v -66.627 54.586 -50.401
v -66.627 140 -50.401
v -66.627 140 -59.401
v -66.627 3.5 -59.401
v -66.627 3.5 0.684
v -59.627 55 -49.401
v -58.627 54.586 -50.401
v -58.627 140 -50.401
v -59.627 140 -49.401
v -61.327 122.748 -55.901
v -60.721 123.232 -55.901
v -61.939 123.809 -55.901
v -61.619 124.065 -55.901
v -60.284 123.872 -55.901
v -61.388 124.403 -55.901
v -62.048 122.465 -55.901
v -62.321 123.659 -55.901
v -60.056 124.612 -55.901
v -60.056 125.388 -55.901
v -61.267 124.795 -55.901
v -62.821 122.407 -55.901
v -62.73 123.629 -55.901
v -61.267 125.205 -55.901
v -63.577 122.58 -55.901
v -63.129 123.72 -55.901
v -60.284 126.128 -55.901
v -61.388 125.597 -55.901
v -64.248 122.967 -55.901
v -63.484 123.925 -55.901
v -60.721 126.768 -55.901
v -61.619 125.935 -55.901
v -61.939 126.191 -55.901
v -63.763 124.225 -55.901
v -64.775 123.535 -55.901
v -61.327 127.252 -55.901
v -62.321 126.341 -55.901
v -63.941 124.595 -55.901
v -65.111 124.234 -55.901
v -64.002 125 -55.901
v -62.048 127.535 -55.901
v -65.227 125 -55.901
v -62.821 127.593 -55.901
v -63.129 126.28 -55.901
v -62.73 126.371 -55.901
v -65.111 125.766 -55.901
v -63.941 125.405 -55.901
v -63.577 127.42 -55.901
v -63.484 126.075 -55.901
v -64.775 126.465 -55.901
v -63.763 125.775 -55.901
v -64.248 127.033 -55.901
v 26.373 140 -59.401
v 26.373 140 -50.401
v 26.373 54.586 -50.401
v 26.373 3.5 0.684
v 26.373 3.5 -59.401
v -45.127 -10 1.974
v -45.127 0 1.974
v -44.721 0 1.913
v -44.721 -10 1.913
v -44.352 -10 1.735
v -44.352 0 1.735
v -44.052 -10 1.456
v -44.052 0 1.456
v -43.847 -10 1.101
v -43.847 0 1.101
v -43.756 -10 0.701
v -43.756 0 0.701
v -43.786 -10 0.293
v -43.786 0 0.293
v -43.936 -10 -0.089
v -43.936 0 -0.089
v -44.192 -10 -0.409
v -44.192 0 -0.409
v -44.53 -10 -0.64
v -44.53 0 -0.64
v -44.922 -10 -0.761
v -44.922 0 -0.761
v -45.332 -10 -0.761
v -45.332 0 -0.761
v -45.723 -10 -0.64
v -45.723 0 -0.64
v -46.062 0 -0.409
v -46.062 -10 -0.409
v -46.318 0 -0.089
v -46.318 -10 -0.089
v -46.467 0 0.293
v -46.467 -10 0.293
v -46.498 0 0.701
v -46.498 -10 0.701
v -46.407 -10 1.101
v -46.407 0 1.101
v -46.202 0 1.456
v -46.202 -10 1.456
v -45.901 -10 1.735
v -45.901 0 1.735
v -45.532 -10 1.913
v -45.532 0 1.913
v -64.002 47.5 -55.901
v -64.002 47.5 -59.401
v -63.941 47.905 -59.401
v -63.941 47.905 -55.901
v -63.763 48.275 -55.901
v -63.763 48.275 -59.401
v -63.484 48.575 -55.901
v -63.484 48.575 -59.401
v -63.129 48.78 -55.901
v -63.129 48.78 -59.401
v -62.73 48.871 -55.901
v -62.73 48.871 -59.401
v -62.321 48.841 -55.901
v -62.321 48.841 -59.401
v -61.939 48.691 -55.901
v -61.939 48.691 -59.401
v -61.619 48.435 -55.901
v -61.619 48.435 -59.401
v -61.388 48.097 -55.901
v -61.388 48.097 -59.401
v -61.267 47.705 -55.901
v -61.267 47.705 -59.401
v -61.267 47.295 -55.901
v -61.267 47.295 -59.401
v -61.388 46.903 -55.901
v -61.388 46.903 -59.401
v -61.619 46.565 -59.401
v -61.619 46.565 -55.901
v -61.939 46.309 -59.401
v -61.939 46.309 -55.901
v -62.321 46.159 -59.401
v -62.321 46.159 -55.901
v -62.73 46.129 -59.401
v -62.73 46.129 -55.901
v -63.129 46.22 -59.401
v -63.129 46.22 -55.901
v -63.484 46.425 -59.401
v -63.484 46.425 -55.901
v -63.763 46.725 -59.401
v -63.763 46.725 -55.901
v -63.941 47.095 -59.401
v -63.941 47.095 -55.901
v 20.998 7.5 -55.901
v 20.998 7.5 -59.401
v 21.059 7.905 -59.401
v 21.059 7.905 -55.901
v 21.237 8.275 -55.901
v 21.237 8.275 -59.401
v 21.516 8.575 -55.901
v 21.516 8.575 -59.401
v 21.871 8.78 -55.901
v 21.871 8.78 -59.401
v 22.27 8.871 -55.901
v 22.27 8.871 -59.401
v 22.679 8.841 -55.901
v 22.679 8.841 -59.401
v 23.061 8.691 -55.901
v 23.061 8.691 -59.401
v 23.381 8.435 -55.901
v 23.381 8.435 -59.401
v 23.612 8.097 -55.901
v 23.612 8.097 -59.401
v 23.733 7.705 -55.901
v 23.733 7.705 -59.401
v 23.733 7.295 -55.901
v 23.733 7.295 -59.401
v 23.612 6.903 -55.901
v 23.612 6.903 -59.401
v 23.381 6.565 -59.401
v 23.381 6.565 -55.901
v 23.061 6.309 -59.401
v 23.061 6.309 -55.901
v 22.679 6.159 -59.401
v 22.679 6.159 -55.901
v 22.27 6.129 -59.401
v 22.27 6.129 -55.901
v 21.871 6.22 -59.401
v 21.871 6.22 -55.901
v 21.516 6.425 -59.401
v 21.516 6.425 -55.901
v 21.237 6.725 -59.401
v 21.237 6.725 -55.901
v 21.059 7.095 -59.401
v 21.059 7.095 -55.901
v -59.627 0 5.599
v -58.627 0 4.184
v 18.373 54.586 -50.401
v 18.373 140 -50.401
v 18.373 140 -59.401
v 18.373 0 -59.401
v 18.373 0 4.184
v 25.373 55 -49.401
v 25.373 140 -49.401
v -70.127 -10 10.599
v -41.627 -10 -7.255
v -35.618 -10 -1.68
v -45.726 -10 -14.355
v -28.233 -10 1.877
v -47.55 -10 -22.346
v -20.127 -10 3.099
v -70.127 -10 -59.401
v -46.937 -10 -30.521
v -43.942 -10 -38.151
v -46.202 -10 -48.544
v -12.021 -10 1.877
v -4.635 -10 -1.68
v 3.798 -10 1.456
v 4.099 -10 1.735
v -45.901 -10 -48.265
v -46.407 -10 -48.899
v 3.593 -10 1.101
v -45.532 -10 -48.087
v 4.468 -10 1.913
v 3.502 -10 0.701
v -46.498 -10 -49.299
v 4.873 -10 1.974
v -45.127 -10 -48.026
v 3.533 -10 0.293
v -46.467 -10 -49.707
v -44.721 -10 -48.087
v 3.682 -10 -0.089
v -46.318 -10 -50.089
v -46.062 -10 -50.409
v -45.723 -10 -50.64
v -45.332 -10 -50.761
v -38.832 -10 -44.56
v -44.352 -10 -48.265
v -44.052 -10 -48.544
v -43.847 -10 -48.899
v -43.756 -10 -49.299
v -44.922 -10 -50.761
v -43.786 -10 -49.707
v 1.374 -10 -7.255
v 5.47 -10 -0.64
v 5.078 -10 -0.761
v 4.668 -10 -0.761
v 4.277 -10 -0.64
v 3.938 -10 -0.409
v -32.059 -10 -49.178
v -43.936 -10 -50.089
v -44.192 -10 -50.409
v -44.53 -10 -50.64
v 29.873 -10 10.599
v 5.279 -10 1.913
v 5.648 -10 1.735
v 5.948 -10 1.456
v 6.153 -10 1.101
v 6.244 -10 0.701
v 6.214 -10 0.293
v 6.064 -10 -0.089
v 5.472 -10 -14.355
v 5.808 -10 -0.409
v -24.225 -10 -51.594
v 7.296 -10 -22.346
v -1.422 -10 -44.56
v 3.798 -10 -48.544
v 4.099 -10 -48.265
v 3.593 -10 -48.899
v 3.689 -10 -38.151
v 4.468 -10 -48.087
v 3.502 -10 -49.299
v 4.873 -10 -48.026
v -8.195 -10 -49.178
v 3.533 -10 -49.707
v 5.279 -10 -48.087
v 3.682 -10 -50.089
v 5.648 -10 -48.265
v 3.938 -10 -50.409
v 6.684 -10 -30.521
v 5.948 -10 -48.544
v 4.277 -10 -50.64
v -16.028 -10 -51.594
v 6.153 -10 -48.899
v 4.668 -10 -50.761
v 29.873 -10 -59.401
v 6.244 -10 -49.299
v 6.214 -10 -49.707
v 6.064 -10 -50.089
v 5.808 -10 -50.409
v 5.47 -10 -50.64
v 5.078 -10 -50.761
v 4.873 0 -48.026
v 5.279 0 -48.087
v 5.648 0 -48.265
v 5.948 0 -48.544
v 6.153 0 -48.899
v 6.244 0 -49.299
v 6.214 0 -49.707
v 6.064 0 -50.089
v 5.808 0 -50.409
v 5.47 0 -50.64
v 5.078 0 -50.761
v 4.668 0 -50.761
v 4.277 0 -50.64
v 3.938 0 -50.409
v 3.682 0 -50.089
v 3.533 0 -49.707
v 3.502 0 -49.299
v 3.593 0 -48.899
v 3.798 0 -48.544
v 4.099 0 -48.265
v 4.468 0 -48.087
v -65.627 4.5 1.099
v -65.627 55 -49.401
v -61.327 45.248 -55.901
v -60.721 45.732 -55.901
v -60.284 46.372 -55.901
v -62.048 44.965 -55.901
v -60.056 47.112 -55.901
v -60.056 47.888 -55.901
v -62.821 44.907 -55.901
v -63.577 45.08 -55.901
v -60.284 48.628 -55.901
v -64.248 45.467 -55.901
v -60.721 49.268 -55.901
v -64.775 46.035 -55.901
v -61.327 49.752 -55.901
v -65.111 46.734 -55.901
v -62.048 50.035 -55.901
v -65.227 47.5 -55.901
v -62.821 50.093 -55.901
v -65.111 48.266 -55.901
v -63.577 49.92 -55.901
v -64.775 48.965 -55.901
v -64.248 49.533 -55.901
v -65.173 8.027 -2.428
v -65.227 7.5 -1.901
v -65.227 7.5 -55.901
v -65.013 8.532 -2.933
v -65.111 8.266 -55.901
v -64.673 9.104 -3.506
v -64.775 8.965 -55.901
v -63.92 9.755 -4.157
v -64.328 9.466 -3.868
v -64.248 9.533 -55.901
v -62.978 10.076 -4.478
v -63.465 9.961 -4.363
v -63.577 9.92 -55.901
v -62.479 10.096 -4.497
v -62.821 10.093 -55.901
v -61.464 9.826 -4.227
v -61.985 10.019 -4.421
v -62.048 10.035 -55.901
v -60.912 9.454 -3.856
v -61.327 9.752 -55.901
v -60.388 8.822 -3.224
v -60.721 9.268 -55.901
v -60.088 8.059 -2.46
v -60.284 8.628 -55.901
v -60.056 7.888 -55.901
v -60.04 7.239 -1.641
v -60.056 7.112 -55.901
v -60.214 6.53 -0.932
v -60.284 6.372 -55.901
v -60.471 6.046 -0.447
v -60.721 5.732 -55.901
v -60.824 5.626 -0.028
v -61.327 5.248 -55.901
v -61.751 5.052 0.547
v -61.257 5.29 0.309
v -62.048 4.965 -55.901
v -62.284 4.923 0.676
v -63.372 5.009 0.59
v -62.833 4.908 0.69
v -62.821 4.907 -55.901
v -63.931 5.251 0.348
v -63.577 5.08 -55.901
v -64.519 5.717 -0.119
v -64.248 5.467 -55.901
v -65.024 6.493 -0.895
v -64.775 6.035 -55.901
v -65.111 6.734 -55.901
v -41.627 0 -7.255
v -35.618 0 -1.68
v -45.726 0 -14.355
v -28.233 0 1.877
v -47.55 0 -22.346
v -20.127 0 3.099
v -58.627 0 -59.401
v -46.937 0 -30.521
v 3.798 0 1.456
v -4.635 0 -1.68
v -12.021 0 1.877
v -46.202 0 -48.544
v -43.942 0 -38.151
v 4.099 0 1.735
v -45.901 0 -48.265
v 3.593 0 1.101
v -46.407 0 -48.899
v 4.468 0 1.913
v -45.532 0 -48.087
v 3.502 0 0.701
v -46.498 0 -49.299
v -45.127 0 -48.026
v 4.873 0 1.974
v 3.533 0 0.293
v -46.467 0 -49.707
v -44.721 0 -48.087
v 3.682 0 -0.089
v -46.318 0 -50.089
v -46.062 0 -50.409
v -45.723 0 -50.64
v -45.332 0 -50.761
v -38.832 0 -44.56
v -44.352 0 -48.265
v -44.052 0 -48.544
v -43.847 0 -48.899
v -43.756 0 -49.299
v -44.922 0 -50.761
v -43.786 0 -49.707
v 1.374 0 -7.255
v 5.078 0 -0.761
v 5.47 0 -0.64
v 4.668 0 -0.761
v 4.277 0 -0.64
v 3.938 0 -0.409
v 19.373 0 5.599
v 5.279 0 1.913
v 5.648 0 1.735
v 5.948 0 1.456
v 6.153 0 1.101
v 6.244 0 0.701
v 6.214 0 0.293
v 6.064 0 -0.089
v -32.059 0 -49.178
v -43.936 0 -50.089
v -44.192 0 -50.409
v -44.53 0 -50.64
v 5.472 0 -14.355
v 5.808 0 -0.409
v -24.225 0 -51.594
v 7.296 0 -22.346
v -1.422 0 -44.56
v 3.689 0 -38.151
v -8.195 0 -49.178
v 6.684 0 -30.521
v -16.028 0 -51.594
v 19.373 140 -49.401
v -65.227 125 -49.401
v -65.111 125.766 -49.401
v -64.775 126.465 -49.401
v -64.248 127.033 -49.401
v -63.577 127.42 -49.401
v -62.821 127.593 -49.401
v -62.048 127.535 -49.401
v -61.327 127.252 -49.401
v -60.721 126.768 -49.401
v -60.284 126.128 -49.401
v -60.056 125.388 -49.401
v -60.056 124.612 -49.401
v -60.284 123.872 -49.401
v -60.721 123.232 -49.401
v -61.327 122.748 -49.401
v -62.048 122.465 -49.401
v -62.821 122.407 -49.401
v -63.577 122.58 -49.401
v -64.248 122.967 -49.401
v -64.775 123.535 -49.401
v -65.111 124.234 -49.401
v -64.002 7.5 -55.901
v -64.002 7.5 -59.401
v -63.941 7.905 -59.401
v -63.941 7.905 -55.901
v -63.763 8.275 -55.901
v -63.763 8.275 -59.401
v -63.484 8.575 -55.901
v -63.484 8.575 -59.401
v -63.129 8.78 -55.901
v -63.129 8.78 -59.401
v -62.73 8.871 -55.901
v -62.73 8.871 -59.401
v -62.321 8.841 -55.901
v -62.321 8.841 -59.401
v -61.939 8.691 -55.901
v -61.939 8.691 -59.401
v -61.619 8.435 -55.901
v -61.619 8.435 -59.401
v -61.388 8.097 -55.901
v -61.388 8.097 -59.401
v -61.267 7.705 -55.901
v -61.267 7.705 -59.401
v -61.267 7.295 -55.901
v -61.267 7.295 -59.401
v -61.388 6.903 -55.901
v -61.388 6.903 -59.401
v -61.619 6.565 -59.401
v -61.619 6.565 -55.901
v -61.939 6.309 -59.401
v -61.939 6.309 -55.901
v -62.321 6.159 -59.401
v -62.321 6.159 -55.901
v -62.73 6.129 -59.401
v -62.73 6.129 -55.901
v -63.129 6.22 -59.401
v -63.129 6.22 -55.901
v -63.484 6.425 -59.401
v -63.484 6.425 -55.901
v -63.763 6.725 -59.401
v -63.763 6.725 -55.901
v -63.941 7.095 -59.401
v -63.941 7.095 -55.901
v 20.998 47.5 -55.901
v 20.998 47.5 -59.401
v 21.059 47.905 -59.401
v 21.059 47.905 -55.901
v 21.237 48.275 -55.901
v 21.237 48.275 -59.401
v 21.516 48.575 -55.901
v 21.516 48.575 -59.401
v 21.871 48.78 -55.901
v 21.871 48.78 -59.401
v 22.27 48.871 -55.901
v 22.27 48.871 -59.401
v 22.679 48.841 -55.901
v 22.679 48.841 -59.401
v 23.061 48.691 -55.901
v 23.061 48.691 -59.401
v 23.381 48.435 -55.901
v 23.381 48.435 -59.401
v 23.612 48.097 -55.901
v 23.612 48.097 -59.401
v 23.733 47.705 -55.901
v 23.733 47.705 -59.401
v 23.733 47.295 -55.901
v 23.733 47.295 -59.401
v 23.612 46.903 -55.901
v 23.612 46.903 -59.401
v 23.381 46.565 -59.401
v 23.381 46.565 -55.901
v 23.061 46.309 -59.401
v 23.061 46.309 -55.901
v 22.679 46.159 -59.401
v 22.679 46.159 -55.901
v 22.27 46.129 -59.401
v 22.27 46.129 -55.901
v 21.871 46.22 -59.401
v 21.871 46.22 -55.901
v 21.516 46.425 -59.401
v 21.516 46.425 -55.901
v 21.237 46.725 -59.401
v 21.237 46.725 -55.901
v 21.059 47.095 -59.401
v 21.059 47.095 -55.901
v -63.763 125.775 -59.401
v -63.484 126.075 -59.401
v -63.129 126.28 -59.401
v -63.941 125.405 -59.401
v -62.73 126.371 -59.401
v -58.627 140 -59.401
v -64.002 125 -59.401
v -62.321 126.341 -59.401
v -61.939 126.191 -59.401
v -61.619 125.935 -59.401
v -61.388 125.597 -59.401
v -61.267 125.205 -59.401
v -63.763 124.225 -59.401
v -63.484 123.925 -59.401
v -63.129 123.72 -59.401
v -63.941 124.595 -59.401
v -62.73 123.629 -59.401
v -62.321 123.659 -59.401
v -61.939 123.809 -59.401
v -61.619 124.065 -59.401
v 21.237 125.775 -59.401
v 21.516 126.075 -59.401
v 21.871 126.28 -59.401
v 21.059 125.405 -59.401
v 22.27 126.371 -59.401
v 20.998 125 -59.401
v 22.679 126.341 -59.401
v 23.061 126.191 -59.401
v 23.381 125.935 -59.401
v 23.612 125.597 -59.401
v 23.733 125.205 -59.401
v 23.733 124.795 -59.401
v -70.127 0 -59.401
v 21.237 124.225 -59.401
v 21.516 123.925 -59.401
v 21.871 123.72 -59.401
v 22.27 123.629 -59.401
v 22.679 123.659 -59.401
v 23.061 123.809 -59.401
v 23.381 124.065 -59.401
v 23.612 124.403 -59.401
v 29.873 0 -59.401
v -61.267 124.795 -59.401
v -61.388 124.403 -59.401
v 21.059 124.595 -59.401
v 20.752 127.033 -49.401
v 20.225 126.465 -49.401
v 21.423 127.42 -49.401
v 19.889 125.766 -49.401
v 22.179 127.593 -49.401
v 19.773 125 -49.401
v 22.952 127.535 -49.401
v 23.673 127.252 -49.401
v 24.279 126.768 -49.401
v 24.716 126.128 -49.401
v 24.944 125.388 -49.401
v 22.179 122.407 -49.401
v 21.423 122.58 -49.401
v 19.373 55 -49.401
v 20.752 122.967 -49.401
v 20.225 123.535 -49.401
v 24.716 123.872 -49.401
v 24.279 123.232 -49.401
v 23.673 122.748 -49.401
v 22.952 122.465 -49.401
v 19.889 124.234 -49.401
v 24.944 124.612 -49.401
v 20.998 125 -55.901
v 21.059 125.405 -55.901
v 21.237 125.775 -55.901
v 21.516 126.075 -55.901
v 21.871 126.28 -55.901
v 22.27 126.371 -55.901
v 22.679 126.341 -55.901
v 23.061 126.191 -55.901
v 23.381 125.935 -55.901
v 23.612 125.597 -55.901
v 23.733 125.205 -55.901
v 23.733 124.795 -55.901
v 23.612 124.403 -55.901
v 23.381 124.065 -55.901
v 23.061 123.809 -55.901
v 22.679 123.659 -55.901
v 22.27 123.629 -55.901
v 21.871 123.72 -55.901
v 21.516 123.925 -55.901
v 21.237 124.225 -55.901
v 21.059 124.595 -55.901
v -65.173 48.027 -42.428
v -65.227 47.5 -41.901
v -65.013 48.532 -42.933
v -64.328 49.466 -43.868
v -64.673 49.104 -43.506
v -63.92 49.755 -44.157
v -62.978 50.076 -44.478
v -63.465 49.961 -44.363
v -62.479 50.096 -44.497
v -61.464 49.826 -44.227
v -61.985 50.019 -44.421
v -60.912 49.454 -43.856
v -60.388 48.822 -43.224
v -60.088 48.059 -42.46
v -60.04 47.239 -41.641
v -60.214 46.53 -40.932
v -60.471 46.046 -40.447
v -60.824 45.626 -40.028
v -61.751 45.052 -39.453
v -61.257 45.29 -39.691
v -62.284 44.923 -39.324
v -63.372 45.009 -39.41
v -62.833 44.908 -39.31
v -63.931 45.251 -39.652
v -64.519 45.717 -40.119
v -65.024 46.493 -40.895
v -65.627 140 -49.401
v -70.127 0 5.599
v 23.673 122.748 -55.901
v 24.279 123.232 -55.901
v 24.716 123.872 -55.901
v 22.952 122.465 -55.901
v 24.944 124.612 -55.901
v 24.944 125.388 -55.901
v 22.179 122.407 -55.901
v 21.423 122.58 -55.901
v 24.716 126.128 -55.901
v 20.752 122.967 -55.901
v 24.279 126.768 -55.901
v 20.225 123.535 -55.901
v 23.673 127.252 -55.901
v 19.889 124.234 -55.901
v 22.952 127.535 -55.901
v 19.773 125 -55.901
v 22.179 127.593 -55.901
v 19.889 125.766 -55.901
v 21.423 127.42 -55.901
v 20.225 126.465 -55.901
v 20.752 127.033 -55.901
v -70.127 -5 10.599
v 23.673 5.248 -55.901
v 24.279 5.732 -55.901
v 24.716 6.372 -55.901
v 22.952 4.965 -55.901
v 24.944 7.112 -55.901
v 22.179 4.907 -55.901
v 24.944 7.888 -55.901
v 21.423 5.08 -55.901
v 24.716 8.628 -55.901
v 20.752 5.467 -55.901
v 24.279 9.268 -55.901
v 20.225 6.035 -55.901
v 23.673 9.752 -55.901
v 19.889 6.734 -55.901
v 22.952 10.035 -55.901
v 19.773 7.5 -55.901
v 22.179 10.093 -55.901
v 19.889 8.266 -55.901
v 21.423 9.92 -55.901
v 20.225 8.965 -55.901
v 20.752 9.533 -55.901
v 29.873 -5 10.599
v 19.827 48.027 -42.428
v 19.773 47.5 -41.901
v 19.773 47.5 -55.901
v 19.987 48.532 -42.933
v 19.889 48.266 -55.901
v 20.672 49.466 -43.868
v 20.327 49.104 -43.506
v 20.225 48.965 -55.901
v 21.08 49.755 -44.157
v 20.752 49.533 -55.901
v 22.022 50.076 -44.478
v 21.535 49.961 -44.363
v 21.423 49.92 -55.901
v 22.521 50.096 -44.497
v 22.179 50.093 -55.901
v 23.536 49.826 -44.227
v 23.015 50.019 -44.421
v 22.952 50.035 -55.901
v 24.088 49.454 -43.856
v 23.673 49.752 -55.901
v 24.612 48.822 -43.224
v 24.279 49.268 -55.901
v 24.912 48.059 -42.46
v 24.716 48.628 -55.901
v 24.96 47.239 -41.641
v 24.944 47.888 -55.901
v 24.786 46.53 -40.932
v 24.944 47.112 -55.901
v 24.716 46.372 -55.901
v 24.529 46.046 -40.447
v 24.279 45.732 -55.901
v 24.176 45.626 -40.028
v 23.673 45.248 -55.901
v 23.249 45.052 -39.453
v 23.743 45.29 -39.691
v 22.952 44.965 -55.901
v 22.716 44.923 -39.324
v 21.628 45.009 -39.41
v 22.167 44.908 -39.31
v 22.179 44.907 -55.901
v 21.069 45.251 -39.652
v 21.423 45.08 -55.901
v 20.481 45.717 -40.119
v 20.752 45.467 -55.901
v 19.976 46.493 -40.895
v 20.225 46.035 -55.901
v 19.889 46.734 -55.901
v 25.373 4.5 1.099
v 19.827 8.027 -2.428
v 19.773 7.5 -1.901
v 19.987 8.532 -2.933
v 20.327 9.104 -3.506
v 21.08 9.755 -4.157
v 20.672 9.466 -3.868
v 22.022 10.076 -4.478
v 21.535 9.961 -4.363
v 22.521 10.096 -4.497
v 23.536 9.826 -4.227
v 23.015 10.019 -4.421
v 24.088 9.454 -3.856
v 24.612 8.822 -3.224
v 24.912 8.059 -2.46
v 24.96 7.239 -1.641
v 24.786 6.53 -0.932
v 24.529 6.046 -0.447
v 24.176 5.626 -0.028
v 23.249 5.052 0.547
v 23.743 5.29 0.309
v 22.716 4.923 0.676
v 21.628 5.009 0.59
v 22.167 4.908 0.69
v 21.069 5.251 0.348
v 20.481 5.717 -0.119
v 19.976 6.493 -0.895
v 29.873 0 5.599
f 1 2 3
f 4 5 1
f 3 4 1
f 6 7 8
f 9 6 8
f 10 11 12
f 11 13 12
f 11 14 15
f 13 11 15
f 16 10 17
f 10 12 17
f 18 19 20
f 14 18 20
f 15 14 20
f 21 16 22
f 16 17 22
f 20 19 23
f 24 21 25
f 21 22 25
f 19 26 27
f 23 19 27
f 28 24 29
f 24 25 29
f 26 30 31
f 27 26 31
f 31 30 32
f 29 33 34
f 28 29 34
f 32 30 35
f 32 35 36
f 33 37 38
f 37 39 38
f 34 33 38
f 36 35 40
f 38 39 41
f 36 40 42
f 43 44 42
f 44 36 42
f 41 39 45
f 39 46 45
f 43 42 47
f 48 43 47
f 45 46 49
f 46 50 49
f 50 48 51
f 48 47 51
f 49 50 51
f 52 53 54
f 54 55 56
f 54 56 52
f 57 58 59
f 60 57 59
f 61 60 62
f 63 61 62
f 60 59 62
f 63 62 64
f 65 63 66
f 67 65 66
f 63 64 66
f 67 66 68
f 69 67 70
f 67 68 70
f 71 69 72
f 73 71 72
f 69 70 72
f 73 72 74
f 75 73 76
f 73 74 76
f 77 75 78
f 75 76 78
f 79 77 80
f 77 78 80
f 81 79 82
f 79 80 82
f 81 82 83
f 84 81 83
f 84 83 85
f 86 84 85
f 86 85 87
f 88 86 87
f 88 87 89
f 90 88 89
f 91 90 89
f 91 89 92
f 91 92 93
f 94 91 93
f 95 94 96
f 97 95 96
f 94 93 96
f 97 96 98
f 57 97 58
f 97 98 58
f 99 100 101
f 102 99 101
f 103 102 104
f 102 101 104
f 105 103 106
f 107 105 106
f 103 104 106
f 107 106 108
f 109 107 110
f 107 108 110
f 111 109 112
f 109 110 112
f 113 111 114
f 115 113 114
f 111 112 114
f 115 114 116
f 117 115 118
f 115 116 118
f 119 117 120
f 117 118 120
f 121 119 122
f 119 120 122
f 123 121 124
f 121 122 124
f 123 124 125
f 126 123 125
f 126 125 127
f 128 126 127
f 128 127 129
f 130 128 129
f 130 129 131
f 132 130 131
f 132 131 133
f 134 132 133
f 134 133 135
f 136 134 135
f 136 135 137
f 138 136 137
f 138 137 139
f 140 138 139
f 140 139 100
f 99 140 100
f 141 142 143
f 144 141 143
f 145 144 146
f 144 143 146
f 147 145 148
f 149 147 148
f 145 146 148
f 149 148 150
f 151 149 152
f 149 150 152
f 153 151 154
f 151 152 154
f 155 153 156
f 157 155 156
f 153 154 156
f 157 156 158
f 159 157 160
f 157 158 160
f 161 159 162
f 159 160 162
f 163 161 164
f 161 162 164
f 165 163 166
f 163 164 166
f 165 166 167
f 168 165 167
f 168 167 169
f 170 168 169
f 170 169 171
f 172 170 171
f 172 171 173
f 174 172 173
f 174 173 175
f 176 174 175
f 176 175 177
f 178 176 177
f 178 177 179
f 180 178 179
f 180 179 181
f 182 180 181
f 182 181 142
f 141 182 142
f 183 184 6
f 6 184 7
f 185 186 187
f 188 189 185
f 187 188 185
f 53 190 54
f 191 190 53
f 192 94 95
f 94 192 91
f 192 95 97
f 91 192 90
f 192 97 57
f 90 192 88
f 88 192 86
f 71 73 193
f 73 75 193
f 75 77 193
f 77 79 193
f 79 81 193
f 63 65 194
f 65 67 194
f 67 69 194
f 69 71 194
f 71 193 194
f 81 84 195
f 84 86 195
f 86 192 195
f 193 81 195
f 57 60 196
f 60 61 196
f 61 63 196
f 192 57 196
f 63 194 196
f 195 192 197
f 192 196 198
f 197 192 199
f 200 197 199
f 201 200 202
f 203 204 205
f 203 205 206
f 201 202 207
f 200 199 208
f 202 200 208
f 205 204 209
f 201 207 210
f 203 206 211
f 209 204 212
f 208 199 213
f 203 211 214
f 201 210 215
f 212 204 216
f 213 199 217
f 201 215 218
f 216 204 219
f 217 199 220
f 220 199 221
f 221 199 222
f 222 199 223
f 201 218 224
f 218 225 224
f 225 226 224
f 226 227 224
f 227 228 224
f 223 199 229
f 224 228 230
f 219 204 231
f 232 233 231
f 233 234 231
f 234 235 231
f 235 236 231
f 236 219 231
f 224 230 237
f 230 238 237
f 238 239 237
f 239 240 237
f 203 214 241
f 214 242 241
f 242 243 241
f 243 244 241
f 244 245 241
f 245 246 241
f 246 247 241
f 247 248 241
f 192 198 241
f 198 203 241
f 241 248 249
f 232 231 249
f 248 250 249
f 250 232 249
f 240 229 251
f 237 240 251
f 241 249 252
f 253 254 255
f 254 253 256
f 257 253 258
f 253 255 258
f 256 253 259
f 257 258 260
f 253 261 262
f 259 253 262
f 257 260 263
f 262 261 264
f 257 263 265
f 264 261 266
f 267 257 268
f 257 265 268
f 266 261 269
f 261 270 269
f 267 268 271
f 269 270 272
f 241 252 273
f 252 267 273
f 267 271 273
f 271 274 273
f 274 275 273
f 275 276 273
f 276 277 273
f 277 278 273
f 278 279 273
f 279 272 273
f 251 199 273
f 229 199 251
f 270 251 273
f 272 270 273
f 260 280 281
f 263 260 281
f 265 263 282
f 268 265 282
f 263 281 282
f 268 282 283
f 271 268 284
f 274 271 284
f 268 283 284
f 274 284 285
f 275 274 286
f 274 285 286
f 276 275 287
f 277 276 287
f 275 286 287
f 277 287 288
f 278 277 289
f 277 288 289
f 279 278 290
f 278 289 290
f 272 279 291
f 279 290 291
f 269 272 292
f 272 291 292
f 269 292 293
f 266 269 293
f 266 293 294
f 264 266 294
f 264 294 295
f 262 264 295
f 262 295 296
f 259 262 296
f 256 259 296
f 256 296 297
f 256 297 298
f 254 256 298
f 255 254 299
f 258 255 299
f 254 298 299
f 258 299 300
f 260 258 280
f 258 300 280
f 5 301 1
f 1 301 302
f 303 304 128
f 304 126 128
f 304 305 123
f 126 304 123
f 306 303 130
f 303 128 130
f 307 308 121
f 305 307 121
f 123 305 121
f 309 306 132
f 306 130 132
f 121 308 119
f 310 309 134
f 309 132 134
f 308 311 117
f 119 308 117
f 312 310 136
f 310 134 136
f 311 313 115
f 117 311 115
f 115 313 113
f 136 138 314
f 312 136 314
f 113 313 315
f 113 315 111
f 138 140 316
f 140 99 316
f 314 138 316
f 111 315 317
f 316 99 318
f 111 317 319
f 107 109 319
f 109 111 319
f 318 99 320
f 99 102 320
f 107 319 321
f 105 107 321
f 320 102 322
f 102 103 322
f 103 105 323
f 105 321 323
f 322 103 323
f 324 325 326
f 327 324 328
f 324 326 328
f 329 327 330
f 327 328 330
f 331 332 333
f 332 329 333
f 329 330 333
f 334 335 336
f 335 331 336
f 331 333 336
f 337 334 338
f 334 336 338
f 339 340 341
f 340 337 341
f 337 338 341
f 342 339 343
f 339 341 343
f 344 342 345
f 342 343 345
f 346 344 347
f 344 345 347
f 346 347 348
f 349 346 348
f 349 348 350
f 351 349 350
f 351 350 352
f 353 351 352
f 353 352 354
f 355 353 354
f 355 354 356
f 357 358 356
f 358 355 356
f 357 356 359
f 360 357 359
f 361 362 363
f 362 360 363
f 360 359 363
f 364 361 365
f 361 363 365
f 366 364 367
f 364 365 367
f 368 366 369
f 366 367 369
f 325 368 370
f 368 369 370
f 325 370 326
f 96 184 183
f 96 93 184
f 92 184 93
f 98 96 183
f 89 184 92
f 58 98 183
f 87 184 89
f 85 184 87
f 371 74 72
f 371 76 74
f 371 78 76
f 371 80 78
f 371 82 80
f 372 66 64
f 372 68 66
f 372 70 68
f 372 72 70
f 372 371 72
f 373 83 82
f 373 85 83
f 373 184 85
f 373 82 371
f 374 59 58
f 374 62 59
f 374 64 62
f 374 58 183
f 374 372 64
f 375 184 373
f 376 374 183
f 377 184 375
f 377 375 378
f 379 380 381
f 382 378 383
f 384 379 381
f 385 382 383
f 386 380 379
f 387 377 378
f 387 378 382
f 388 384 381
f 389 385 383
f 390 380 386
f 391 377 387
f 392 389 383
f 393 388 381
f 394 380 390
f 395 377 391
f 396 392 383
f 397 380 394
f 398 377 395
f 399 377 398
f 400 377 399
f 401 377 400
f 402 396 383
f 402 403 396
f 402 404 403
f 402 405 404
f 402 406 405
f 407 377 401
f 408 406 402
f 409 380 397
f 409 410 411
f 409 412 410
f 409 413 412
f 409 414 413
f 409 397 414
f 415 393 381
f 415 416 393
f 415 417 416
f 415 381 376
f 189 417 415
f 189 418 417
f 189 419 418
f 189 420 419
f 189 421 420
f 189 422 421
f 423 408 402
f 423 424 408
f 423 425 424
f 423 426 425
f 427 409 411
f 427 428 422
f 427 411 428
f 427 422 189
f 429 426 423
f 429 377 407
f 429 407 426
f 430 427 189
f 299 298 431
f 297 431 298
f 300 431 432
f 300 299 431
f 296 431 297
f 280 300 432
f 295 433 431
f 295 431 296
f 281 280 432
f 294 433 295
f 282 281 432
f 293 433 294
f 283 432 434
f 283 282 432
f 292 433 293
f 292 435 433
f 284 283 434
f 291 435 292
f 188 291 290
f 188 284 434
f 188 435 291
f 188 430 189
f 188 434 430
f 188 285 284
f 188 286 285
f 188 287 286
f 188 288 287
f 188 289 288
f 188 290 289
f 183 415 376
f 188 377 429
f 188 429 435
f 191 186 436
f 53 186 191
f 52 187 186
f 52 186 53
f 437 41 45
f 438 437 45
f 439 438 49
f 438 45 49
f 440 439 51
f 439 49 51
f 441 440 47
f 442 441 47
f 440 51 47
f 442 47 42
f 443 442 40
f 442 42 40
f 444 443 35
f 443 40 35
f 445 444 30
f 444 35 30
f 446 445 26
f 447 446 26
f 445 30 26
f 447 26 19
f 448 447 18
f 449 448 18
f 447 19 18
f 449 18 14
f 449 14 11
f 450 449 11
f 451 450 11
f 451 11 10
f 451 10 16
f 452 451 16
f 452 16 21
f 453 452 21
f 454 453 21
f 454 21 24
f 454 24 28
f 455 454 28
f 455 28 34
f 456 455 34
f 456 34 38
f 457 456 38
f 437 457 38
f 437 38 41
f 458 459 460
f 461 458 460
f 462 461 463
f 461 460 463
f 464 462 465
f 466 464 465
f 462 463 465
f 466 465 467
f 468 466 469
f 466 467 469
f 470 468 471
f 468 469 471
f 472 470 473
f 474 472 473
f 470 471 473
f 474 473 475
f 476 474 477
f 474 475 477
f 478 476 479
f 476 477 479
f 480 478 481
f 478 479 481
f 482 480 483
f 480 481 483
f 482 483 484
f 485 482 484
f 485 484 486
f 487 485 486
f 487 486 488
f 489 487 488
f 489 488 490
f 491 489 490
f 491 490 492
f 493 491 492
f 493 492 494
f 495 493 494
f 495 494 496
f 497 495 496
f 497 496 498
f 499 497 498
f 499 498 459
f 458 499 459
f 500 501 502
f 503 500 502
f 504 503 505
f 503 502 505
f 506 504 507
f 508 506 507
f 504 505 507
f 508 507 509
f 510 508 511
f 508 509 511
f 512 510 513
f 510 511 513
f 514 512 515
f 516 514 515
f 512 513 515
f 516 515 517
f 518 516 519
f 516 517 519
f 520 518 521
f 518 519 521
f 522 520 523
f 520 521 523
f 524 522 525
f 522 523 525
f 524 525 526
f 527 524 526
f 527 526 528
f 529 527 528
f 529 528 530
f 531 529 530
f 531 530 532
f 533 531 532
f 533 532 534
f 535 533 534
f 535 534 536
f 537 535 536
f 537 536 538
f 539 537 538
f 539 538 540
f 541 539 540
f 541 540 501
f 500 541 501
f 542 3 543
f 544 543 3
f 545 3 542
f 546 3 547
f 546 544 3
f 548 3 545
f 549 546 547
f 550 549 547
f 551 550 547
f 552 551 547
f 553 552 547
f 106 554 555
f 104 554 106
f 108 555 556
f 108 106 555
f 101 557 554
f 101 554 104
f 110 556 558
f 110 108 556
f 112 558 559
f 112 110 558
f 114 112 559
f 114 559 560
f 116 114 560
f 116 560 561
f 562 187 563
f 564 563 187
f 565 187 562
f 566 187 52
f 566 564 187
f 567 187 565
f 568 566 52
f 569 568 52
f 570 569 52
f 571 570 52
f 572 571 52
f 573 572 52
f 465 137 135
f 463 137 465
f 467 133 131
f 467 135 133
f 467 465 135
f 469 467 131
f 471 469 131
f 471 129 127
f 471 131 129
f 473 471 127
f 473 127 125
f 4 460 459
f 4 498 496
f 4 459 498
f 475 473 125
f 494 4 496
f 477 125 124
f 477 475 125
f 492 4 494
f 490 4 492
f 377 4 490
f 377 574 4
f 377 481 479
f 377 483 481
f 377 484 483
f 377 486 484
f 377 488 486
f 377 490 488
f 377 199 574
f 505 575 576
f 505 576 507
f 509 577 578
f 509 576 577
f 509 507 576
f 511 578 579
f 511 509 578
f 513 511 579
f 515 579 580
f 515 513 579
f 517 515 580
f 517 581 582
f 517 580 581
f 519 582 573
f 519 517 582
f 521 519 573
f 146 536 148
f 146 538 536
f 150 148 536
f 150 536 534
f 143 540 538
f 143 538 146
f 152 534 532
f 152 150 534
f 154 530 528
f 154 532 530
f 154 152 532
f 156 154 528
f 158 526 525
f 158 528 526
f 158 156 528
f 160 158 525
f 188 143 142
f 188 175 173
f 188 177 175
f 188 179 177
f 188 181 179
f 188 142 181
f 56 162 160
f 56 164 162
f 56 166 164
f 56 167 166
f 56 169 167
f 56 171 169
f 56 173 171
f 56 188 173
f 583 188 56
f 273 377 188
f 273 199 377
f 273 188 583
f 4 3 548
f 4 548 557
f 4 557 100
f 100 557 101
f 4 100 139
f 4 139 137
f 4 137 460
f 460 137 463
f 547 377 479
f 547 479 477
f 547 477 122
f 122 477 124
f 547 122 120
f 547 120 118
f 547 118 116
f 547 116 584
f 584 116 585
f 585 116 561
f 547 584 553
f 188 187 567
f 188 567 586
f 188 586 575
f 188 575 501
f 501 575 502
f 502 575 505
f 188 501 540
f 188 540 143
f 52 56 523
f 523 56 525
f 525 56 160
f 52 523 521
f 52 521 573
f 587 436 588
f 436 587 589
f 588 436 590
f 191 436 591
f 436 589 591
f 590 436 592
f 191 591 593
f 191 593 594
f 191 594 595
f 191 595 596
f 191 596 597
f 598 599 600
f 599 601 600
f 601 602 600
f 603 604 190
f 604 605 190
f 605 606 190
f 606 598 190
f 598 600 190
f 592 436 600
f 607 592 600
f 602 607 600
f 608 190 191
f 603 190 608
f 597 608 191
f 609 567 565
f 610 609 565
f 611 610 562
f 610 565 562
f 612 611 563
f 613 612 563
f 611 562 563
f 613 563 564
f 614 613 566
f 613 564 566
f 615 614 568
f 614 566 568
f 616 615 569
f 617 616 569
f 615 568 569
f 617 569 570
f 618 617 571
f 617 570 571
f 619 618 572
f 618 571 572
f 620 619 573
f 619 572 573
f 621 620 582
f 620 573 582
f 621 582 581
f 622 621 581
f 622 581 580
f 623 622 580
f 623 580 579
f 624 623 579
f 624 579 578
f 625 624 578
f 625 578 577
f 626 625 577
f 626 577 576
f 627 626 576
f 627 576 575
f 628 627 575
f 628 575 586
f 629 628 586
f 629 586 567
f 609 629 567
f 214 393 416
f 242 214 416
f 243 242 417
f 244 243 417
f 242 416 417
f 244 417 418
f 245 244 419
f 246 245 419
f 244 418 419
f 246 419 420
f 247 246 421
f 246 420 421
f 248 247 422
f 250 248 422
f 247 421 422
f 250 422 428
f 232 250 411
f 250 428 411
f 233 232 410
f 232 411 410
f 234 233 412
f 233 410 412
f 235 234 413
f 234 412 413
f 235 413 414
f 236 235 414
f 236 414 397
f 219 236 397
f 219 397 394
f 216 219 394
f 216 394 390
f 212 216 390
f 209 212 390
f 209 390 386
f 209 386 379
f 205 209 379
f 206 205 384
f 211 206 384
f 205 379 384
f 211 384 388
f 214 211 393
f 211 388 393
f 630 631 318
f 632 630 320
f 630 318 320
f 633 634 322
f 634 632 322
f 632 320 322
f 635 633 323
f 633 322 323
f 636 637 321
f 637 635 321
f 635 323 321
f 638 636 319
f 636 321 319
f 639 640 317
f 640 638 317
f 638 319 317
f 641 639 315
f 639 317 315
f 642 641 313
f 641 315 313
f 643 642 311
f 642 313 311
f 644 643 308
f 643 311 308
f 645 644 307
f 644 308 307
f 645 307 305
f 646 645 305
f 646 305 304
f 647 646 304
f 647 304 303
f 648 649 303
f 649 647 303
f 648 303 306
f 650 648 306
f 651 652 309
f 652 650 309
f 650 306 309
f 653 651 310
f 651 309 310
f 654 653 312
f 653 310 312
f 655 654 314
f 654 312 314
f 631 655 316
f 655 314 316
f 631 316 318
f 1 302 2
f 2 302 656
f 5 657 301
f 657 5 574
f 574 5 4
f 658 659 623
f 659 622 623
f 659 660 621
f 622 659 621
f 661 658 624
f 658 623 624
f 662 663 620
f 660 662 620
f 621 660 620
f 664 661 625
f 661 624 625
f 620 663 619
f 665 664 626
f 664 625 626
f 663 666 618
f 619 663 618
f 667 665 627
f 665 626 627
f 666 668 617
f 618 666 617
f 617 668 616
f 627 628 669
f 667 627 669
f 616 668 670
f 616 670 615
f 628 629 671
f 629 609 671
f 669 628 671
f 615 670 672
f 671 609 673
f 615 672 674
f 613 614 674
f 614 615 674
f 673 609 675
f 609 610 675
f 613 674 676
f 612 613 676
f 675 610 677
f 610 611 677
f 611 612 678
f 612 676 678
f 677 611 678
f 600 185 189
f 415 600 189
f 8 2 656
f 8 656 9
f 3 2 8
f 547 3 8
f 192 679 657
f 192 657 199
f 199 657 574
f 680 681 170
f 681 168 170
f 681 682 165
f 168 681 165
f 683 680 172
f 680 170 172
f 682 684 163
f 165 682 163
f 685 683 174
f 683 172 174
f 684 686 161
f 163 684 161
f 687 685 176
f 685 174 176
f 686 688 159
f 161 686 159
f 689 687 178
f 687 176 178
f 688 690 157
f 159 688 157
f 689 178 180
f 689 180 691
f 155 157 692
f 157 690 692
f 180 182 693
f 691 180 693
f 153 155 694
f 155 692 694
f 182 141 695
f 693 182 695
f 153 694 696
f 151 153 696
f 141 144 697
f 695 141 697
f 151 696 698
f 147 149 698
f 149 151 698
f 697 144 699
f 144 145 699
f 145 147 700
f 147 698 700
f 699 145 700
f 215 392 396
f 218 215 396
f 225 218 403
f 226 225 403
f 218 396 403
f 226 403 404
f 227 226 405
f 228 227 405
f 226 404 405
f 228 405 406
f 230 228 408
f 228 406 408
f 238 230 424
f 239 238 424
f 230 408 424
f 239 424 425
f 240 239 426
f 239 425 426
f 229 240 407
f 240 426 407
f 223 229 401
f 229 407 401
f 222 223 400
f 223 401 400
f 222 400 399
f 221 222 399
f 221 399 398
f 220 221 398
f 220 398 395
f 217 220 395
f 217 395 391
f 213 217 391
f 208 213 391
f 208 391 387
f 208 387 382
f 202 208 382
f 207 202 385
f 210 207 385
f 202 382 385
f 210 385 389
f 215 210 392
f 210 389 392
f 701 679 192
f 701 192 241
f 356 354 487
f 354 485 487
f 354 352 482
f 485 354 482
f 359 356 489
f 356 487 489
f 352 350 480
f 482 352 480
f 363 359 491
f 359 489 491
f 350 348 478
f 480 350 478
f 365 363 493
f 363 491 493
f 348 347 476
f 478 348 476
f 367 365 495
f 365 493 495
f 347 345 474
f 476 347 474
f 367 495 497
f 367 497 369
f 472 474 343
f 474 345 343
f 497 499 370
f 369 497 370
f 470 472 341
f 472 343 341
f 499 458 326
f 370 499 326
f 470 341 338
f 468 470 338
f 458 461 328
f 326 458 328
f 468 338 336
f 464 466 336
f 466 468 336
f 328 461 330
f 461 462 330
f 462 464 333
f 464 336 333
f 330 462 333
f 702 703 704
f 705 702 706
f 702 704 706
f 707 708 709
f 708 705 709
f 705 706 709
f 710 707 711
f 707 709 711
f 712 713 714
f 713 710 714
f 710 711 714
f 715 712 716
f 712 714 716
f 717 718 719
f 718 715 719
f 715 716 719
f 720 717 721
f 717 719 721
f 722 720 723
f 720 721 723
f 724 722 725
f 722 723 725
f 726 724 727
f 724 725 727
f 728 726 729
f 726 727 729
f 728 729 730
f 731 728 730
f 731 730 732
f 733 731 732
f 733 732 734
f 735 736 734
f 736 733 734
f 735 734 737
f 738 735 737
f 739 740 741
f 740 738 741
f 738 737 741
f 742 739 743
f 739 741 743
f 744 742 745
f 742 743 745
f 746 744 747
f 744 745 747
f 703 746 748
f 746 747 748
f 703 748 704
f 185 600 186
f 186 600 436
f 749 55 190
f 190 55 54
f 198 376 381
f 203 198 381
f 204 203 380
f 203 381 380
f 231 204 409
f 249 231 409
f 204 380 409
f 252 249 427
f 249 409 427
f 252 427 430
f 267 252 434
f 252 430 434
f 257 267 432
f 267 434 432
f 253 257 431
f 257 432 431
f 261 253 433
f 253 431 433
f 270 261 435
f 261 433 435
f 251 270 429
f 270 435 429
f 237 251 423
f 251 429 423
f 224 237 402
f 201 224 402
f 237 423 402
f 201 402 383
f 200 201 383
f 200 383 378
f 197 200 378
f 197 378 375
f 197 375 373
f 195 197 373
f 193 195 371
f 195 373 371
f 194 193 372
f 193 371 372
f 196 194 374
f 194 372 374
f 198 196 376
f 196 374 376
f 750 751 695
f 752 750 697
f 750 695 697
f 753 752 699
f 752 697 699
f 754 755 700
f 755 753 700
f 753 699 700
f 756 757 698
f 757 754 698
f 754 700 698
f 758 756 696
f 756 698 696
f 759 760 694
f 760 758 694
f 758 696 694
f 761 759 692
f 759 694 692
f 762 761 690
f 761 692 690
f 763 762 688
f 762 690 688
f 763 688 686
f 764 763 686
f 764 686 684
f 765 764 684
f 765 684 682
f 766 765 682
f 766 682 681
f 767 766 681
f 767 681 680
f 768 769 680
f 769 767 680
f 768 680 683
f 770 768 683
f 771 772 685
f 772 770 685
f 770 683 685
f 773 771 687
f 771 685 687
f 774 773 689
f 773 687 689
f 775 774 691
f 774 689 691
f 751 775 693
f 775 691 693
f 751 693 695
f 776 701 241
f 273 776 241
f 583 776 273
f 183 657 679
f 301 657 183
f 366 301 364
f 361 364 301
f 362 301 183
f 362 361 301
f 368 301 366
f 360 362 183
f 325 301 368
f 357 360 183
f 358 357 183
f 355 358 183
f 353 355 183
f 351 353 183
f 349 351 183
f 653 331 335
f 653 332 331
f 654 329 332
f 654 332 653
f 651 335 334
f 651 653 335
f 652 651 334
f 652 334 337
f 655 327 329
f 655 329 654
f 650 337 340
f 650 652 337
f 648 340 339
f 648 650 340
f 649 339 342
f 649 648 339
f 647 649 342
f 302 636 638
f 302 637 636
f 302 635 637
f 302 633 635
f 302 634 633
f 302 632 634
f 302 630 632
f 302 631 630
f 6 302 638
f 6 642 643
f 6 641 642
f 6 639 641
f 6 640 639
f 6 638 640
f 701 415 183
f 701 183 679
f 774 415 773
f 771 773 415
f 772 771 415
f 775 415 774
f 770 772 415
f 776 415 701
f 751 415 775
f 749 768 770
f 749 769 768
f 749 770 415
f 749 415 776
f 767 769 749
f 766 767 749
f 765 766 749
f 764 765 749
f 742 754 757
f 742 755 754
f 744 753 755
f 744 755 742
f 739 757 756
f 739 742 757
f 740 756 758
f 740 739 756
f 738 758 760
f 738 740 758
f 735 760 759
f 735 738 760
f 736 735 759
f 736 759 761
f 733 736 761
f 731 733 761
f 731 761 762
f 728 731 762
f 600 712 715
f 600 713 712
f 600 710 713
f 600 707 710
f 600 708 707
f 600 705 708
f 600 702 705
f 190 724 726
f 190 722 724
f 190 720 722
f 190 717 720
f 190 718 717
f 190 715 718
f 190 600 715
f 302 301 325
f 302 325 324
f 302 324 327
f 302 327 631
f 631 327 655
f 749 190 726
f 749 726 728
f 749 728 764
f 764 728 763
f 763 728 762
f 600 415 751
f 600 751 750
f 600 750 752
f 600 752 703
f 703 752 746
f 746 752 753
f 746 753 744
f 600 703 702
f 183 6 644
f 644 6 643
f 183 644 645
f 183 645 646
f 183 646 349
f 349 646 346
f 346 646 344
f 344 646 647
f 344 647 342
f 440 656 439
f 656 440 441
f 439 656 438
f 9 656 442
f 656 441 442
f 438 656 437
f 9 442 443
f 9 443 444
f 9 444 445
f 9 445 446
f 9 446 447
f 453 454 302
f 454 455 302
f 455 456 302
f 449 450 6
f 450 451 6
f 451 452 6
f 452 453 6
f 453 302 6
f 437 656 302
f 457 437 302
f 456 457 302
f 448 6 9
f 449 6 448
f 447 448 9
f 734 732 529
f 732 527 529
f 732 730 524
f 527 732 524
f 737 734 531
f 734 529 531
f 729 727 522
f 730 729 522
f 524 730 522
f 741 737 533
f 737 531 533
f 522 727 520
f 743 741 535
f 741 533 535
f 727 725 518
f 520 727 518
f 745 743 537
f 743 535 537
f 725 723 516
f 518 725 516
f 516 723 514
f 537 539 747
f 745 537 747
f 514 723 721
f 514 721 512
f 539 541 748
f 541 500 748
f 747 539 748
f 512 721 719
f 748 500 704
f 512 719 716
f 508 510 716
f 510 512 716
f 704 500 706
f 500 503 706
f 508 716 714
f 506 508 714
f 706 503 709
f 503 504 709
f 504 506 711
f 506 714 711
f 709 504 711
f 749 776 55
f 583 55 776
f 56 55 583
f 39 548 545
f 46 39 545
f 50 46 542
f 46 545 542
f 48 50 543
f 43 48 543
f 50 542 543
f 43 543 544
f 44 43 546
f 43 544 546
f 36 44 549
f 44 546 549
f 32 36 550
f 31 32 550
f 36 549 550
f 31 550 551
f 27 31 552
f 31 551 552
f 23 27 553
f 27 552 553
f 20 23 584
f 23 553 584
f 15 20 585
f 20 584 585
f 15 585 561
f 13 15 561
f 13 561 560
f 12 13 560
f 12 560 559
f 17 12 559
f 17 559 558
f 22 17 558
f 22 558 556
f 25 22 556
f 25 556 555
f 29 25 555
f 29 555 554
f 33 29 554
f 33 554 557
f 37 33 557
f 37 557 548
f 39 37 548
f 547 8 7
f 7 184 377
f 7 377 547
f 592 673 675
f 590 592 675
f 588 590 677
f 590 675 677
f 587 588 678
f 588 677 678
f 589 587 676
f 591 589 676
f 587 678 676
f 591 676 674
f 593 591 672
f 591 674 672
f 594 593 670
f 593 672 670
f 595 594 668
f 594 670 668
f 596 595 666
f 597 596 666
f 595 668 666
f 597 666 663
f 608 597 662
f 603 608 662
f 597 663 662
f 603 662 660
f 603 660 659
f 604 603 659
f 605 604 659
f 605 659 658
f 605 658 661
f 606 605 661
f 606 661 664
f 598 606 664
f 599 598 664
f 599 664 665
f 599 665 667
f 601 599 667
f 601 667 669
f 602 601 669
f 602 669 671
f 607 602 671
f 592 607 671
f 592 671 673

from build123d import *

# Parameters (mm, degrees)
SKETCH1_W           = 100
SKETCH1_H           = 70
SKETCH1_R           = 1.375
SKETCH1_R_2         = 27.5
BOSS_EXTRUDE1_DEPTH = 10
SKETCH3_W           = 8
SKETCH3_H           = 70
BOSS_EXTRUDE2_DEPTH = 55
CHAMFER1_SIZE       = 60
CHAMFER2_SIZE       = 3.5
SKETCH5_W           = 8
SKETCH5_H           = 10
BOSS_EXTRUDE3_DEPTH = 85
CUT_EXTRUDE1_START  = -3.5
SKETCH4_R           = 2.6
CUT_EXTRUDE1_DEPTH  = 169.016070813
SKETCH4_3_R         = 1.375
CUT_EXTRUDE2_DEPTH  = 172.516070813
CHAMFER3_SIZE       = 1


with BuildPart() as part:
    # Sketch1 → Boss-Extrude1 (new body)
    with BuildSketch(Plane(origin=(0, 0, 0), x_dir=(1, 0, 0), z_dir=(0, 1, 0))):
        with Locations((-20.126760563, 24.401408451)):
            Rectangle(SKETCH1_W, SKETCH1_H)
        with Locations(Location((-45.126760563, 49.401408451, 0), (0, 0, 270))):
            Circle(SKETCH1_R, mode=Mode.SUBTRACT)
        with Locations(Location((4.873239437, 49.401408451, 0), (0, 0, 270))):
            Circle(SKETCH1_R, mode=Mode.SUBTRACT)
        with Locations(Location((4.873239437, -0.598591549, 0), (0, 0, 270))):
            Circle(SKETCH1_R, mode=Mode.SUBTRACT)
        with Locations(Location((-45.126760563, -0.598591549, 0), (0, 0, 270))):
            Circle(SKETCH1_R, mode=Mode.SUBTRACT)
        with Locations(Location((-20.126760563, 24.401408451, 0), (0, 0, 270))):
            Circle(SKETCH1_R_2, mode=Mode.SUBTRACT)
    extrude(amount=-BOSS_EXTRUDE1_DEPTH)

    # Sketch3 → Boss-Extrude2 (add)
    with BuildSketch(Plane(origin=(0, 0, 0), x_dir=(1, 0, 0), z_dir=(0, 1, 0))):
        with Locations((-62.626760563, 24.401408451)):
            Rectangle(SKETCH3_W, SKETCH3_H)
        with Locations((22.373239437, 24.401408451)):
            Rectangle(SKETCH3_W, SKETCH3_H)
    extrude(amount=BOSS_EXTRUDE2_DEPTH)

    # Chamfer1
    chamfer1_edges = [part.edges().sort_by_distance(p)[0] for p in [
        (-62.626760563, 55, 10.598591549),
    ]]
    chamfer(chamfer1_edges, length=CHAMFER1_SIZE)

    # Chamfer2
    chamfer2_edges = [part.edges().sort_by_distance(p)[0] for p in [
        (26.373239437, 0, -26.901408451),
        (-66.626760563, 0, -26.901408451),
    ]]
    chamfer(chamfer2_edges, length=CHAMFER2_SIZE - 0.0001)  # a hair under: the kernel refuses the full size

    # Sketch5 → Boss-Extrude3 (add)
    with BuildSketch(Plane(origin=(0, 55, 0), x_dir=(1, 0, 0), z_dir=(0, 1, 0))):
        with Locations((-62.626760563, 54.401408451)):
            Rectangle(SKETCH5_W, SKETCH5_H)
        with Locations((22.373239437, 54.401408451)):
            Rectangle(SKETCH5_W, SKETCH5_H)
    extrude(amount=BOSS_EXTRUDE3_DEPTH)

    # Sketch4 → Cut-Extrude1 (cut, through all)
    with BuildSketch(Plane(origin=(0, 0, -59.401408451), x_dir=(-1, 0, 0), z_dir=(0, 0, -1)).offset(CUT_EXTRUDE1_START)):
        with Locations((-22.373239437, 47.5)):
            Circle(SKETCH4_R)
        with Locations((62.626760563, 47.5)):
            Circle(SKETCH4_R)
        with Locations((62.626760563, 7.5)):
            Circle(SKETCH4_R)
        with Locations((-22.373239437, 7.5)):
            Circle(SKETCH4_R)
        with Locations((-22.373239437, 125)):
            Circle(SKETCH4_R)
        with Locations((62.626760563, 125)):
            Circle(SKETCH4_R)
    extrude(amount=-CUT_EXTRUDE1_DEPTH, mode=Mode.SUBTRACT)

    # Sketch4<3> → Cut-Extrude2 (cut, through all)
    with BuildSketch(Plane(origin=(0, 0, -59.401408451), x_dir=(-1, 0, 0), z_dir=(0, 0, -1))):
        with Locations((-22.373239437, 47.5)):
            Circle(SKETCH4_3_R)
        with Locations((-22.373239437, 7.5)):
            Circle(SKETCH4_3_R)
        with Locations((62.626760563, 47.5)):
            Circle(SKETCH4_3_R)
        with Locations((62.626760563, 7.5)):
            Circle(SKETCH4_3_R)
        with Locations((-22.373239437, 125)):
            Circle(SKETCH4_3_R)
        with Locations((62.626760563, 125)):
            Circle(SKETCH4_3_R)
    extrude(amount=-CUT_EXTRUDE2_DEPTH, mode=Mode.SUBTRACT)

    # Chamfer3
    chamfer3_edges = [part.edges().sort_by_distance(p)[0] for p in [
        (-66.626760563, 29.24995, -23.651358451),
        (-66.626760563, 97.5, -49.401408451),
        (-58.626760563, 97.5, -49.401408451),
        (26.373239437, 97.5, -49.401408451),
        (18.373239437, 97.5, -49.401408451),
        (26.373239437, 29.24995, -23.651358451),
        (18.373239437, 27.5, -21.901408451),
        (-58.626760563, 27.5, -21.901408451),
    ]]
    chamfer(chamfer3_edges, length=CHAMFER3_SIZE)


solid = part.part
